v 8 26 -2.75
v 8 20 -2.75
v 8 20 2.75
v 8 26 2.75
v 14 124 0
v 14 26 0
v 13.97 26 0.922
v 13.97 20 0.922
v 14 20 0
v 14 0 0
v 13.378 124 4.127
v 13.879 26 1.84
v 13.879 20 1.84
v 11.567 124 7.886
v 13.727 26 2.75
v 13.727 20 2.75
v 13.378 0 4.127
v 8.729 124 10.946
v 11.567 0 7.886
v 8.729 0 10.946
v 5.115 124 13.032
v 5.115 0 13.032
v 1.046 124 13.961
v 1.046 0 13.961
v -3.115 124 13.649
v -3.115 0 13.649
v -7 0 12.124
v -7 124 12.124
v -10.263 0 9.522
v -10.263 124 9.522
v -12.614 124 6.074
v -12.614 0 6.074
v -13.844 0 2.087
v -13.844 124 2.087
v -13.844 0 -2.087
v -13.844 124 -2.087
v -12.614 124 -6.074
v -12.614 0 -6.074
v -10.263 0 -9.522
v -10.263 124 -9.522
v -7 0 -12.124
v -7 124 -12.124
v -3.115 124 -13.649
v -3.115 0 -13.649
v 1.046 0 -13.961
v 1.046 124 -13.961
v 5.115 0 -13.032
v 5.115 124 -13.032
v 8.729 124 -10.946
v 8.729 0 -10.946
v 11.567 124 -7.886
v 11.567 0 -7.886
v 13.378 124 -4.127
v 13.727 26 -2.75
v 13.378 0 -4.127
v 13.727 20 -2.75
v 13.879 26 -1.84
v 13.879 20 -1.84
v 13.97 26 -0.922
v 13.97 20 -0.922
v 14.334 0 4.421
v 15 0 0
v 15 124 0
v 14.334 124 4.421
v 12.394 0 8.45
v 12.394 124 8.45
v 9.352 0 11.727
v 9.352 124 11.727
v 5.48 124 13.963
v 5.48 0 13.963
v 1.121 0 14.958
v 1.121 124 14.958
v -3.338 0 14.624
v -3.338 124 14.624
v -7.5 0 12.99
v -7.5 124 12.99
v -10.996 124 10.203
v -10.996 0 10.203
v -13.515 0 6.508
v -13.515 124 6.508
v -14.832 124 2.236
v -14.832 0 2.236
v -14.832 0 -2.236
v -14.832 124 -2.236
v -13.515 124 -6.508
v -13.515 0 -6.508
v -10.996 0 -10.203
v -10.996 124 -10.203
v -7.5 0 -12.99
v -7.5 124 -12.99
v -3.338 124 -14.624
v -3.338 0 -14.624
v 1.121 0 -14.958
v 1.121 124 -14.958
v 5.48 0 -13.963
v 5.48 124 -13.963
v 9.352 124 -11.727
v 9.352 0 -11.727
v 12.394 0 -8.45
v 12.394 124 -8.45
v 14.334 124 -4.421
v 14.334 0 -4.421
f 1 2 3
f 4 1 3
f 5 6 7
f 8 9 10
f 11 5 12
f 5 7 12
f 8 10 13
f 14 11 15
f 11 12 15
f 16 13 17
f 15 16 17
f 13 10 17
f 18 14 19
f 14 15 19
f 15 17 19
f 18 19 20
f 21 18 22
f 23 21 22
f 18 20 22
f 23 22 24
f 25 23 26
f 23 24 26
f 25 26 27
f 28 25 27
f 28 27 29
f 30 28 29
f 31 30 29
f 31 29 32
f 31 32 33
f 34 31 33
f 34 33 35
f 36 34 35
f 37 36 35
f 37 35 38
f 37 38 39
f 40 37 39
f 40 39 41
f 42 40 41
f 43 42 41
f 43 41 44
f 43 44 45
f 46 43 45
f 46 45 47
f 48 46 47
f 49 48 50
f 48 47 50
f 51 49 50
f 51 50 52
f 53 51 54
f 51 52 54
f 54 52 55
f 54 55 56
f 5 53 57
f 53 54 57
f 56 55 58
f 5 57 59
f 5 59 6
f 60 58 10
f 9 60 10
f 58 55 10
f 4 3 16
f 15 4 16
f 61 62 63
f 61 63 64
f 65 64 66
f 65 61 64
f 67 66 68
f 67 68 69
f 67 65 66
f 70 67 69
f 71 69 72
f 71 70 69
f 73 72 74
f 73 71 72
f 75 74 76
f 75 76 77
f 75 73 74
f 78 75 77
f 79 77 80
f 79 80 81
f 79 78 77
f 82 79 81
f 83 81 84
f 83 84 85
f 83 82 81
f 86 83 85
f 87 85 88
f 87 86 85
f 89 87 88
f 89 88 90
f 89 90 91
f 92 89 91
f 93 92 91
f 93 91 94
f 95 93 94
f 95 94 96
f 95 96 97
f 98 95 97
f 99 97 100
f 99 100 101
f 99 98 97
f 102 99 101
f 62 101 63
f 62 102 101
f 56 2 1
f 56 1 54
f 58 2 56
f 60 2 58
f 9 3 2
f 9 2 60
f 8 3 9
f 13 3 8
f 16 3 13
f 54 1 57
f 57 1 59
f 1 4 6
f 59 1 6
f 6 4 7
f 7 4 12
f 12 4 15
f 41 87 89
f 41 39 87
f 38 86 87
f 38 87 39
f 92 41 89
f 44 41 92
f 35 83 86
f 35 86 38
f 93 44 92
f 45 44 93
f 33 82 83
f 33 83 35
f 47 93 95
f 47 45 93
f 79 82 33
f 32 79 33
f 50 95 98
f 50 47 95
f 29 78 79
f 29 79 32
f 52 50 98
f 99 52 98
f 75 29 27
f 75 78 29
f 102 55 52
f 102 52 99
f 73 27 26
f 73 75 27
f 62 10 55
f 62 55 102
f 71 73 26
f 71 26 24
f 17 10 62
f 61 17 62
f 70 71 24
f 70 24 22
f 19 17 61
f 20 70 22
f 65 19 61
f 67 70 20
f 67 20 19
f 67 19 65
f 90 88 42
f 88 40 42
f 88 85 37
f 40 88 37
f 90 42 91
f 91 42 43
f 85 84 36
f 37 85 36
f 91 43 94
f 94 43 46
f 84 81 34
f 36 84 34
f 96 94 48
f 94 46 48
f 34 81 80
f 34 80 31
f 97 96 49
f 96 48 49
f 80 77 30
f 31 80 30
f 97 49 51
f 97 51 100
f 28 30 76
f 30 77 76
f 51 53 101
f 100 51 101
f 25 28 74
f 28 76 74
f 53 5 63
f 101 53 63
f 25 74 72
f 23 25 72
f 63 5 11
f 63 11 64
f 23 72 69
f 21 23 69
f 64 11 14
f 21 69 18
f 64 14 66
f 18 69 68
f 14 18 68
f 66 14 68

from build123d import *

# Parameters (mm, degrees)
F0_R     = 15
F0_R_2   = 14
F1_DEPTH = 124
F3_W     = 6.176928
F3_H     = 5.5
F4_DEPTH = 6


with BuildPart() as f1:
    # F0 (on Front) → F1 (new body)
    with BuildSketch(Plane.XZ):
        Circle(F0_R)
        Circle(F0_R_2, mode=Mode.SUBTRACT)
    extrude(amount=-F1_DEPTH)

    # F3 (on offset) → F4 (join)
    with BuildSketch(Plane.XZ.offset(-20)):
        with Locations((11.088464, 0)):
            Rectangle(F3_W, F3_H)
    extrude(amount=-F4_DEPTH)


solid = f1.part
